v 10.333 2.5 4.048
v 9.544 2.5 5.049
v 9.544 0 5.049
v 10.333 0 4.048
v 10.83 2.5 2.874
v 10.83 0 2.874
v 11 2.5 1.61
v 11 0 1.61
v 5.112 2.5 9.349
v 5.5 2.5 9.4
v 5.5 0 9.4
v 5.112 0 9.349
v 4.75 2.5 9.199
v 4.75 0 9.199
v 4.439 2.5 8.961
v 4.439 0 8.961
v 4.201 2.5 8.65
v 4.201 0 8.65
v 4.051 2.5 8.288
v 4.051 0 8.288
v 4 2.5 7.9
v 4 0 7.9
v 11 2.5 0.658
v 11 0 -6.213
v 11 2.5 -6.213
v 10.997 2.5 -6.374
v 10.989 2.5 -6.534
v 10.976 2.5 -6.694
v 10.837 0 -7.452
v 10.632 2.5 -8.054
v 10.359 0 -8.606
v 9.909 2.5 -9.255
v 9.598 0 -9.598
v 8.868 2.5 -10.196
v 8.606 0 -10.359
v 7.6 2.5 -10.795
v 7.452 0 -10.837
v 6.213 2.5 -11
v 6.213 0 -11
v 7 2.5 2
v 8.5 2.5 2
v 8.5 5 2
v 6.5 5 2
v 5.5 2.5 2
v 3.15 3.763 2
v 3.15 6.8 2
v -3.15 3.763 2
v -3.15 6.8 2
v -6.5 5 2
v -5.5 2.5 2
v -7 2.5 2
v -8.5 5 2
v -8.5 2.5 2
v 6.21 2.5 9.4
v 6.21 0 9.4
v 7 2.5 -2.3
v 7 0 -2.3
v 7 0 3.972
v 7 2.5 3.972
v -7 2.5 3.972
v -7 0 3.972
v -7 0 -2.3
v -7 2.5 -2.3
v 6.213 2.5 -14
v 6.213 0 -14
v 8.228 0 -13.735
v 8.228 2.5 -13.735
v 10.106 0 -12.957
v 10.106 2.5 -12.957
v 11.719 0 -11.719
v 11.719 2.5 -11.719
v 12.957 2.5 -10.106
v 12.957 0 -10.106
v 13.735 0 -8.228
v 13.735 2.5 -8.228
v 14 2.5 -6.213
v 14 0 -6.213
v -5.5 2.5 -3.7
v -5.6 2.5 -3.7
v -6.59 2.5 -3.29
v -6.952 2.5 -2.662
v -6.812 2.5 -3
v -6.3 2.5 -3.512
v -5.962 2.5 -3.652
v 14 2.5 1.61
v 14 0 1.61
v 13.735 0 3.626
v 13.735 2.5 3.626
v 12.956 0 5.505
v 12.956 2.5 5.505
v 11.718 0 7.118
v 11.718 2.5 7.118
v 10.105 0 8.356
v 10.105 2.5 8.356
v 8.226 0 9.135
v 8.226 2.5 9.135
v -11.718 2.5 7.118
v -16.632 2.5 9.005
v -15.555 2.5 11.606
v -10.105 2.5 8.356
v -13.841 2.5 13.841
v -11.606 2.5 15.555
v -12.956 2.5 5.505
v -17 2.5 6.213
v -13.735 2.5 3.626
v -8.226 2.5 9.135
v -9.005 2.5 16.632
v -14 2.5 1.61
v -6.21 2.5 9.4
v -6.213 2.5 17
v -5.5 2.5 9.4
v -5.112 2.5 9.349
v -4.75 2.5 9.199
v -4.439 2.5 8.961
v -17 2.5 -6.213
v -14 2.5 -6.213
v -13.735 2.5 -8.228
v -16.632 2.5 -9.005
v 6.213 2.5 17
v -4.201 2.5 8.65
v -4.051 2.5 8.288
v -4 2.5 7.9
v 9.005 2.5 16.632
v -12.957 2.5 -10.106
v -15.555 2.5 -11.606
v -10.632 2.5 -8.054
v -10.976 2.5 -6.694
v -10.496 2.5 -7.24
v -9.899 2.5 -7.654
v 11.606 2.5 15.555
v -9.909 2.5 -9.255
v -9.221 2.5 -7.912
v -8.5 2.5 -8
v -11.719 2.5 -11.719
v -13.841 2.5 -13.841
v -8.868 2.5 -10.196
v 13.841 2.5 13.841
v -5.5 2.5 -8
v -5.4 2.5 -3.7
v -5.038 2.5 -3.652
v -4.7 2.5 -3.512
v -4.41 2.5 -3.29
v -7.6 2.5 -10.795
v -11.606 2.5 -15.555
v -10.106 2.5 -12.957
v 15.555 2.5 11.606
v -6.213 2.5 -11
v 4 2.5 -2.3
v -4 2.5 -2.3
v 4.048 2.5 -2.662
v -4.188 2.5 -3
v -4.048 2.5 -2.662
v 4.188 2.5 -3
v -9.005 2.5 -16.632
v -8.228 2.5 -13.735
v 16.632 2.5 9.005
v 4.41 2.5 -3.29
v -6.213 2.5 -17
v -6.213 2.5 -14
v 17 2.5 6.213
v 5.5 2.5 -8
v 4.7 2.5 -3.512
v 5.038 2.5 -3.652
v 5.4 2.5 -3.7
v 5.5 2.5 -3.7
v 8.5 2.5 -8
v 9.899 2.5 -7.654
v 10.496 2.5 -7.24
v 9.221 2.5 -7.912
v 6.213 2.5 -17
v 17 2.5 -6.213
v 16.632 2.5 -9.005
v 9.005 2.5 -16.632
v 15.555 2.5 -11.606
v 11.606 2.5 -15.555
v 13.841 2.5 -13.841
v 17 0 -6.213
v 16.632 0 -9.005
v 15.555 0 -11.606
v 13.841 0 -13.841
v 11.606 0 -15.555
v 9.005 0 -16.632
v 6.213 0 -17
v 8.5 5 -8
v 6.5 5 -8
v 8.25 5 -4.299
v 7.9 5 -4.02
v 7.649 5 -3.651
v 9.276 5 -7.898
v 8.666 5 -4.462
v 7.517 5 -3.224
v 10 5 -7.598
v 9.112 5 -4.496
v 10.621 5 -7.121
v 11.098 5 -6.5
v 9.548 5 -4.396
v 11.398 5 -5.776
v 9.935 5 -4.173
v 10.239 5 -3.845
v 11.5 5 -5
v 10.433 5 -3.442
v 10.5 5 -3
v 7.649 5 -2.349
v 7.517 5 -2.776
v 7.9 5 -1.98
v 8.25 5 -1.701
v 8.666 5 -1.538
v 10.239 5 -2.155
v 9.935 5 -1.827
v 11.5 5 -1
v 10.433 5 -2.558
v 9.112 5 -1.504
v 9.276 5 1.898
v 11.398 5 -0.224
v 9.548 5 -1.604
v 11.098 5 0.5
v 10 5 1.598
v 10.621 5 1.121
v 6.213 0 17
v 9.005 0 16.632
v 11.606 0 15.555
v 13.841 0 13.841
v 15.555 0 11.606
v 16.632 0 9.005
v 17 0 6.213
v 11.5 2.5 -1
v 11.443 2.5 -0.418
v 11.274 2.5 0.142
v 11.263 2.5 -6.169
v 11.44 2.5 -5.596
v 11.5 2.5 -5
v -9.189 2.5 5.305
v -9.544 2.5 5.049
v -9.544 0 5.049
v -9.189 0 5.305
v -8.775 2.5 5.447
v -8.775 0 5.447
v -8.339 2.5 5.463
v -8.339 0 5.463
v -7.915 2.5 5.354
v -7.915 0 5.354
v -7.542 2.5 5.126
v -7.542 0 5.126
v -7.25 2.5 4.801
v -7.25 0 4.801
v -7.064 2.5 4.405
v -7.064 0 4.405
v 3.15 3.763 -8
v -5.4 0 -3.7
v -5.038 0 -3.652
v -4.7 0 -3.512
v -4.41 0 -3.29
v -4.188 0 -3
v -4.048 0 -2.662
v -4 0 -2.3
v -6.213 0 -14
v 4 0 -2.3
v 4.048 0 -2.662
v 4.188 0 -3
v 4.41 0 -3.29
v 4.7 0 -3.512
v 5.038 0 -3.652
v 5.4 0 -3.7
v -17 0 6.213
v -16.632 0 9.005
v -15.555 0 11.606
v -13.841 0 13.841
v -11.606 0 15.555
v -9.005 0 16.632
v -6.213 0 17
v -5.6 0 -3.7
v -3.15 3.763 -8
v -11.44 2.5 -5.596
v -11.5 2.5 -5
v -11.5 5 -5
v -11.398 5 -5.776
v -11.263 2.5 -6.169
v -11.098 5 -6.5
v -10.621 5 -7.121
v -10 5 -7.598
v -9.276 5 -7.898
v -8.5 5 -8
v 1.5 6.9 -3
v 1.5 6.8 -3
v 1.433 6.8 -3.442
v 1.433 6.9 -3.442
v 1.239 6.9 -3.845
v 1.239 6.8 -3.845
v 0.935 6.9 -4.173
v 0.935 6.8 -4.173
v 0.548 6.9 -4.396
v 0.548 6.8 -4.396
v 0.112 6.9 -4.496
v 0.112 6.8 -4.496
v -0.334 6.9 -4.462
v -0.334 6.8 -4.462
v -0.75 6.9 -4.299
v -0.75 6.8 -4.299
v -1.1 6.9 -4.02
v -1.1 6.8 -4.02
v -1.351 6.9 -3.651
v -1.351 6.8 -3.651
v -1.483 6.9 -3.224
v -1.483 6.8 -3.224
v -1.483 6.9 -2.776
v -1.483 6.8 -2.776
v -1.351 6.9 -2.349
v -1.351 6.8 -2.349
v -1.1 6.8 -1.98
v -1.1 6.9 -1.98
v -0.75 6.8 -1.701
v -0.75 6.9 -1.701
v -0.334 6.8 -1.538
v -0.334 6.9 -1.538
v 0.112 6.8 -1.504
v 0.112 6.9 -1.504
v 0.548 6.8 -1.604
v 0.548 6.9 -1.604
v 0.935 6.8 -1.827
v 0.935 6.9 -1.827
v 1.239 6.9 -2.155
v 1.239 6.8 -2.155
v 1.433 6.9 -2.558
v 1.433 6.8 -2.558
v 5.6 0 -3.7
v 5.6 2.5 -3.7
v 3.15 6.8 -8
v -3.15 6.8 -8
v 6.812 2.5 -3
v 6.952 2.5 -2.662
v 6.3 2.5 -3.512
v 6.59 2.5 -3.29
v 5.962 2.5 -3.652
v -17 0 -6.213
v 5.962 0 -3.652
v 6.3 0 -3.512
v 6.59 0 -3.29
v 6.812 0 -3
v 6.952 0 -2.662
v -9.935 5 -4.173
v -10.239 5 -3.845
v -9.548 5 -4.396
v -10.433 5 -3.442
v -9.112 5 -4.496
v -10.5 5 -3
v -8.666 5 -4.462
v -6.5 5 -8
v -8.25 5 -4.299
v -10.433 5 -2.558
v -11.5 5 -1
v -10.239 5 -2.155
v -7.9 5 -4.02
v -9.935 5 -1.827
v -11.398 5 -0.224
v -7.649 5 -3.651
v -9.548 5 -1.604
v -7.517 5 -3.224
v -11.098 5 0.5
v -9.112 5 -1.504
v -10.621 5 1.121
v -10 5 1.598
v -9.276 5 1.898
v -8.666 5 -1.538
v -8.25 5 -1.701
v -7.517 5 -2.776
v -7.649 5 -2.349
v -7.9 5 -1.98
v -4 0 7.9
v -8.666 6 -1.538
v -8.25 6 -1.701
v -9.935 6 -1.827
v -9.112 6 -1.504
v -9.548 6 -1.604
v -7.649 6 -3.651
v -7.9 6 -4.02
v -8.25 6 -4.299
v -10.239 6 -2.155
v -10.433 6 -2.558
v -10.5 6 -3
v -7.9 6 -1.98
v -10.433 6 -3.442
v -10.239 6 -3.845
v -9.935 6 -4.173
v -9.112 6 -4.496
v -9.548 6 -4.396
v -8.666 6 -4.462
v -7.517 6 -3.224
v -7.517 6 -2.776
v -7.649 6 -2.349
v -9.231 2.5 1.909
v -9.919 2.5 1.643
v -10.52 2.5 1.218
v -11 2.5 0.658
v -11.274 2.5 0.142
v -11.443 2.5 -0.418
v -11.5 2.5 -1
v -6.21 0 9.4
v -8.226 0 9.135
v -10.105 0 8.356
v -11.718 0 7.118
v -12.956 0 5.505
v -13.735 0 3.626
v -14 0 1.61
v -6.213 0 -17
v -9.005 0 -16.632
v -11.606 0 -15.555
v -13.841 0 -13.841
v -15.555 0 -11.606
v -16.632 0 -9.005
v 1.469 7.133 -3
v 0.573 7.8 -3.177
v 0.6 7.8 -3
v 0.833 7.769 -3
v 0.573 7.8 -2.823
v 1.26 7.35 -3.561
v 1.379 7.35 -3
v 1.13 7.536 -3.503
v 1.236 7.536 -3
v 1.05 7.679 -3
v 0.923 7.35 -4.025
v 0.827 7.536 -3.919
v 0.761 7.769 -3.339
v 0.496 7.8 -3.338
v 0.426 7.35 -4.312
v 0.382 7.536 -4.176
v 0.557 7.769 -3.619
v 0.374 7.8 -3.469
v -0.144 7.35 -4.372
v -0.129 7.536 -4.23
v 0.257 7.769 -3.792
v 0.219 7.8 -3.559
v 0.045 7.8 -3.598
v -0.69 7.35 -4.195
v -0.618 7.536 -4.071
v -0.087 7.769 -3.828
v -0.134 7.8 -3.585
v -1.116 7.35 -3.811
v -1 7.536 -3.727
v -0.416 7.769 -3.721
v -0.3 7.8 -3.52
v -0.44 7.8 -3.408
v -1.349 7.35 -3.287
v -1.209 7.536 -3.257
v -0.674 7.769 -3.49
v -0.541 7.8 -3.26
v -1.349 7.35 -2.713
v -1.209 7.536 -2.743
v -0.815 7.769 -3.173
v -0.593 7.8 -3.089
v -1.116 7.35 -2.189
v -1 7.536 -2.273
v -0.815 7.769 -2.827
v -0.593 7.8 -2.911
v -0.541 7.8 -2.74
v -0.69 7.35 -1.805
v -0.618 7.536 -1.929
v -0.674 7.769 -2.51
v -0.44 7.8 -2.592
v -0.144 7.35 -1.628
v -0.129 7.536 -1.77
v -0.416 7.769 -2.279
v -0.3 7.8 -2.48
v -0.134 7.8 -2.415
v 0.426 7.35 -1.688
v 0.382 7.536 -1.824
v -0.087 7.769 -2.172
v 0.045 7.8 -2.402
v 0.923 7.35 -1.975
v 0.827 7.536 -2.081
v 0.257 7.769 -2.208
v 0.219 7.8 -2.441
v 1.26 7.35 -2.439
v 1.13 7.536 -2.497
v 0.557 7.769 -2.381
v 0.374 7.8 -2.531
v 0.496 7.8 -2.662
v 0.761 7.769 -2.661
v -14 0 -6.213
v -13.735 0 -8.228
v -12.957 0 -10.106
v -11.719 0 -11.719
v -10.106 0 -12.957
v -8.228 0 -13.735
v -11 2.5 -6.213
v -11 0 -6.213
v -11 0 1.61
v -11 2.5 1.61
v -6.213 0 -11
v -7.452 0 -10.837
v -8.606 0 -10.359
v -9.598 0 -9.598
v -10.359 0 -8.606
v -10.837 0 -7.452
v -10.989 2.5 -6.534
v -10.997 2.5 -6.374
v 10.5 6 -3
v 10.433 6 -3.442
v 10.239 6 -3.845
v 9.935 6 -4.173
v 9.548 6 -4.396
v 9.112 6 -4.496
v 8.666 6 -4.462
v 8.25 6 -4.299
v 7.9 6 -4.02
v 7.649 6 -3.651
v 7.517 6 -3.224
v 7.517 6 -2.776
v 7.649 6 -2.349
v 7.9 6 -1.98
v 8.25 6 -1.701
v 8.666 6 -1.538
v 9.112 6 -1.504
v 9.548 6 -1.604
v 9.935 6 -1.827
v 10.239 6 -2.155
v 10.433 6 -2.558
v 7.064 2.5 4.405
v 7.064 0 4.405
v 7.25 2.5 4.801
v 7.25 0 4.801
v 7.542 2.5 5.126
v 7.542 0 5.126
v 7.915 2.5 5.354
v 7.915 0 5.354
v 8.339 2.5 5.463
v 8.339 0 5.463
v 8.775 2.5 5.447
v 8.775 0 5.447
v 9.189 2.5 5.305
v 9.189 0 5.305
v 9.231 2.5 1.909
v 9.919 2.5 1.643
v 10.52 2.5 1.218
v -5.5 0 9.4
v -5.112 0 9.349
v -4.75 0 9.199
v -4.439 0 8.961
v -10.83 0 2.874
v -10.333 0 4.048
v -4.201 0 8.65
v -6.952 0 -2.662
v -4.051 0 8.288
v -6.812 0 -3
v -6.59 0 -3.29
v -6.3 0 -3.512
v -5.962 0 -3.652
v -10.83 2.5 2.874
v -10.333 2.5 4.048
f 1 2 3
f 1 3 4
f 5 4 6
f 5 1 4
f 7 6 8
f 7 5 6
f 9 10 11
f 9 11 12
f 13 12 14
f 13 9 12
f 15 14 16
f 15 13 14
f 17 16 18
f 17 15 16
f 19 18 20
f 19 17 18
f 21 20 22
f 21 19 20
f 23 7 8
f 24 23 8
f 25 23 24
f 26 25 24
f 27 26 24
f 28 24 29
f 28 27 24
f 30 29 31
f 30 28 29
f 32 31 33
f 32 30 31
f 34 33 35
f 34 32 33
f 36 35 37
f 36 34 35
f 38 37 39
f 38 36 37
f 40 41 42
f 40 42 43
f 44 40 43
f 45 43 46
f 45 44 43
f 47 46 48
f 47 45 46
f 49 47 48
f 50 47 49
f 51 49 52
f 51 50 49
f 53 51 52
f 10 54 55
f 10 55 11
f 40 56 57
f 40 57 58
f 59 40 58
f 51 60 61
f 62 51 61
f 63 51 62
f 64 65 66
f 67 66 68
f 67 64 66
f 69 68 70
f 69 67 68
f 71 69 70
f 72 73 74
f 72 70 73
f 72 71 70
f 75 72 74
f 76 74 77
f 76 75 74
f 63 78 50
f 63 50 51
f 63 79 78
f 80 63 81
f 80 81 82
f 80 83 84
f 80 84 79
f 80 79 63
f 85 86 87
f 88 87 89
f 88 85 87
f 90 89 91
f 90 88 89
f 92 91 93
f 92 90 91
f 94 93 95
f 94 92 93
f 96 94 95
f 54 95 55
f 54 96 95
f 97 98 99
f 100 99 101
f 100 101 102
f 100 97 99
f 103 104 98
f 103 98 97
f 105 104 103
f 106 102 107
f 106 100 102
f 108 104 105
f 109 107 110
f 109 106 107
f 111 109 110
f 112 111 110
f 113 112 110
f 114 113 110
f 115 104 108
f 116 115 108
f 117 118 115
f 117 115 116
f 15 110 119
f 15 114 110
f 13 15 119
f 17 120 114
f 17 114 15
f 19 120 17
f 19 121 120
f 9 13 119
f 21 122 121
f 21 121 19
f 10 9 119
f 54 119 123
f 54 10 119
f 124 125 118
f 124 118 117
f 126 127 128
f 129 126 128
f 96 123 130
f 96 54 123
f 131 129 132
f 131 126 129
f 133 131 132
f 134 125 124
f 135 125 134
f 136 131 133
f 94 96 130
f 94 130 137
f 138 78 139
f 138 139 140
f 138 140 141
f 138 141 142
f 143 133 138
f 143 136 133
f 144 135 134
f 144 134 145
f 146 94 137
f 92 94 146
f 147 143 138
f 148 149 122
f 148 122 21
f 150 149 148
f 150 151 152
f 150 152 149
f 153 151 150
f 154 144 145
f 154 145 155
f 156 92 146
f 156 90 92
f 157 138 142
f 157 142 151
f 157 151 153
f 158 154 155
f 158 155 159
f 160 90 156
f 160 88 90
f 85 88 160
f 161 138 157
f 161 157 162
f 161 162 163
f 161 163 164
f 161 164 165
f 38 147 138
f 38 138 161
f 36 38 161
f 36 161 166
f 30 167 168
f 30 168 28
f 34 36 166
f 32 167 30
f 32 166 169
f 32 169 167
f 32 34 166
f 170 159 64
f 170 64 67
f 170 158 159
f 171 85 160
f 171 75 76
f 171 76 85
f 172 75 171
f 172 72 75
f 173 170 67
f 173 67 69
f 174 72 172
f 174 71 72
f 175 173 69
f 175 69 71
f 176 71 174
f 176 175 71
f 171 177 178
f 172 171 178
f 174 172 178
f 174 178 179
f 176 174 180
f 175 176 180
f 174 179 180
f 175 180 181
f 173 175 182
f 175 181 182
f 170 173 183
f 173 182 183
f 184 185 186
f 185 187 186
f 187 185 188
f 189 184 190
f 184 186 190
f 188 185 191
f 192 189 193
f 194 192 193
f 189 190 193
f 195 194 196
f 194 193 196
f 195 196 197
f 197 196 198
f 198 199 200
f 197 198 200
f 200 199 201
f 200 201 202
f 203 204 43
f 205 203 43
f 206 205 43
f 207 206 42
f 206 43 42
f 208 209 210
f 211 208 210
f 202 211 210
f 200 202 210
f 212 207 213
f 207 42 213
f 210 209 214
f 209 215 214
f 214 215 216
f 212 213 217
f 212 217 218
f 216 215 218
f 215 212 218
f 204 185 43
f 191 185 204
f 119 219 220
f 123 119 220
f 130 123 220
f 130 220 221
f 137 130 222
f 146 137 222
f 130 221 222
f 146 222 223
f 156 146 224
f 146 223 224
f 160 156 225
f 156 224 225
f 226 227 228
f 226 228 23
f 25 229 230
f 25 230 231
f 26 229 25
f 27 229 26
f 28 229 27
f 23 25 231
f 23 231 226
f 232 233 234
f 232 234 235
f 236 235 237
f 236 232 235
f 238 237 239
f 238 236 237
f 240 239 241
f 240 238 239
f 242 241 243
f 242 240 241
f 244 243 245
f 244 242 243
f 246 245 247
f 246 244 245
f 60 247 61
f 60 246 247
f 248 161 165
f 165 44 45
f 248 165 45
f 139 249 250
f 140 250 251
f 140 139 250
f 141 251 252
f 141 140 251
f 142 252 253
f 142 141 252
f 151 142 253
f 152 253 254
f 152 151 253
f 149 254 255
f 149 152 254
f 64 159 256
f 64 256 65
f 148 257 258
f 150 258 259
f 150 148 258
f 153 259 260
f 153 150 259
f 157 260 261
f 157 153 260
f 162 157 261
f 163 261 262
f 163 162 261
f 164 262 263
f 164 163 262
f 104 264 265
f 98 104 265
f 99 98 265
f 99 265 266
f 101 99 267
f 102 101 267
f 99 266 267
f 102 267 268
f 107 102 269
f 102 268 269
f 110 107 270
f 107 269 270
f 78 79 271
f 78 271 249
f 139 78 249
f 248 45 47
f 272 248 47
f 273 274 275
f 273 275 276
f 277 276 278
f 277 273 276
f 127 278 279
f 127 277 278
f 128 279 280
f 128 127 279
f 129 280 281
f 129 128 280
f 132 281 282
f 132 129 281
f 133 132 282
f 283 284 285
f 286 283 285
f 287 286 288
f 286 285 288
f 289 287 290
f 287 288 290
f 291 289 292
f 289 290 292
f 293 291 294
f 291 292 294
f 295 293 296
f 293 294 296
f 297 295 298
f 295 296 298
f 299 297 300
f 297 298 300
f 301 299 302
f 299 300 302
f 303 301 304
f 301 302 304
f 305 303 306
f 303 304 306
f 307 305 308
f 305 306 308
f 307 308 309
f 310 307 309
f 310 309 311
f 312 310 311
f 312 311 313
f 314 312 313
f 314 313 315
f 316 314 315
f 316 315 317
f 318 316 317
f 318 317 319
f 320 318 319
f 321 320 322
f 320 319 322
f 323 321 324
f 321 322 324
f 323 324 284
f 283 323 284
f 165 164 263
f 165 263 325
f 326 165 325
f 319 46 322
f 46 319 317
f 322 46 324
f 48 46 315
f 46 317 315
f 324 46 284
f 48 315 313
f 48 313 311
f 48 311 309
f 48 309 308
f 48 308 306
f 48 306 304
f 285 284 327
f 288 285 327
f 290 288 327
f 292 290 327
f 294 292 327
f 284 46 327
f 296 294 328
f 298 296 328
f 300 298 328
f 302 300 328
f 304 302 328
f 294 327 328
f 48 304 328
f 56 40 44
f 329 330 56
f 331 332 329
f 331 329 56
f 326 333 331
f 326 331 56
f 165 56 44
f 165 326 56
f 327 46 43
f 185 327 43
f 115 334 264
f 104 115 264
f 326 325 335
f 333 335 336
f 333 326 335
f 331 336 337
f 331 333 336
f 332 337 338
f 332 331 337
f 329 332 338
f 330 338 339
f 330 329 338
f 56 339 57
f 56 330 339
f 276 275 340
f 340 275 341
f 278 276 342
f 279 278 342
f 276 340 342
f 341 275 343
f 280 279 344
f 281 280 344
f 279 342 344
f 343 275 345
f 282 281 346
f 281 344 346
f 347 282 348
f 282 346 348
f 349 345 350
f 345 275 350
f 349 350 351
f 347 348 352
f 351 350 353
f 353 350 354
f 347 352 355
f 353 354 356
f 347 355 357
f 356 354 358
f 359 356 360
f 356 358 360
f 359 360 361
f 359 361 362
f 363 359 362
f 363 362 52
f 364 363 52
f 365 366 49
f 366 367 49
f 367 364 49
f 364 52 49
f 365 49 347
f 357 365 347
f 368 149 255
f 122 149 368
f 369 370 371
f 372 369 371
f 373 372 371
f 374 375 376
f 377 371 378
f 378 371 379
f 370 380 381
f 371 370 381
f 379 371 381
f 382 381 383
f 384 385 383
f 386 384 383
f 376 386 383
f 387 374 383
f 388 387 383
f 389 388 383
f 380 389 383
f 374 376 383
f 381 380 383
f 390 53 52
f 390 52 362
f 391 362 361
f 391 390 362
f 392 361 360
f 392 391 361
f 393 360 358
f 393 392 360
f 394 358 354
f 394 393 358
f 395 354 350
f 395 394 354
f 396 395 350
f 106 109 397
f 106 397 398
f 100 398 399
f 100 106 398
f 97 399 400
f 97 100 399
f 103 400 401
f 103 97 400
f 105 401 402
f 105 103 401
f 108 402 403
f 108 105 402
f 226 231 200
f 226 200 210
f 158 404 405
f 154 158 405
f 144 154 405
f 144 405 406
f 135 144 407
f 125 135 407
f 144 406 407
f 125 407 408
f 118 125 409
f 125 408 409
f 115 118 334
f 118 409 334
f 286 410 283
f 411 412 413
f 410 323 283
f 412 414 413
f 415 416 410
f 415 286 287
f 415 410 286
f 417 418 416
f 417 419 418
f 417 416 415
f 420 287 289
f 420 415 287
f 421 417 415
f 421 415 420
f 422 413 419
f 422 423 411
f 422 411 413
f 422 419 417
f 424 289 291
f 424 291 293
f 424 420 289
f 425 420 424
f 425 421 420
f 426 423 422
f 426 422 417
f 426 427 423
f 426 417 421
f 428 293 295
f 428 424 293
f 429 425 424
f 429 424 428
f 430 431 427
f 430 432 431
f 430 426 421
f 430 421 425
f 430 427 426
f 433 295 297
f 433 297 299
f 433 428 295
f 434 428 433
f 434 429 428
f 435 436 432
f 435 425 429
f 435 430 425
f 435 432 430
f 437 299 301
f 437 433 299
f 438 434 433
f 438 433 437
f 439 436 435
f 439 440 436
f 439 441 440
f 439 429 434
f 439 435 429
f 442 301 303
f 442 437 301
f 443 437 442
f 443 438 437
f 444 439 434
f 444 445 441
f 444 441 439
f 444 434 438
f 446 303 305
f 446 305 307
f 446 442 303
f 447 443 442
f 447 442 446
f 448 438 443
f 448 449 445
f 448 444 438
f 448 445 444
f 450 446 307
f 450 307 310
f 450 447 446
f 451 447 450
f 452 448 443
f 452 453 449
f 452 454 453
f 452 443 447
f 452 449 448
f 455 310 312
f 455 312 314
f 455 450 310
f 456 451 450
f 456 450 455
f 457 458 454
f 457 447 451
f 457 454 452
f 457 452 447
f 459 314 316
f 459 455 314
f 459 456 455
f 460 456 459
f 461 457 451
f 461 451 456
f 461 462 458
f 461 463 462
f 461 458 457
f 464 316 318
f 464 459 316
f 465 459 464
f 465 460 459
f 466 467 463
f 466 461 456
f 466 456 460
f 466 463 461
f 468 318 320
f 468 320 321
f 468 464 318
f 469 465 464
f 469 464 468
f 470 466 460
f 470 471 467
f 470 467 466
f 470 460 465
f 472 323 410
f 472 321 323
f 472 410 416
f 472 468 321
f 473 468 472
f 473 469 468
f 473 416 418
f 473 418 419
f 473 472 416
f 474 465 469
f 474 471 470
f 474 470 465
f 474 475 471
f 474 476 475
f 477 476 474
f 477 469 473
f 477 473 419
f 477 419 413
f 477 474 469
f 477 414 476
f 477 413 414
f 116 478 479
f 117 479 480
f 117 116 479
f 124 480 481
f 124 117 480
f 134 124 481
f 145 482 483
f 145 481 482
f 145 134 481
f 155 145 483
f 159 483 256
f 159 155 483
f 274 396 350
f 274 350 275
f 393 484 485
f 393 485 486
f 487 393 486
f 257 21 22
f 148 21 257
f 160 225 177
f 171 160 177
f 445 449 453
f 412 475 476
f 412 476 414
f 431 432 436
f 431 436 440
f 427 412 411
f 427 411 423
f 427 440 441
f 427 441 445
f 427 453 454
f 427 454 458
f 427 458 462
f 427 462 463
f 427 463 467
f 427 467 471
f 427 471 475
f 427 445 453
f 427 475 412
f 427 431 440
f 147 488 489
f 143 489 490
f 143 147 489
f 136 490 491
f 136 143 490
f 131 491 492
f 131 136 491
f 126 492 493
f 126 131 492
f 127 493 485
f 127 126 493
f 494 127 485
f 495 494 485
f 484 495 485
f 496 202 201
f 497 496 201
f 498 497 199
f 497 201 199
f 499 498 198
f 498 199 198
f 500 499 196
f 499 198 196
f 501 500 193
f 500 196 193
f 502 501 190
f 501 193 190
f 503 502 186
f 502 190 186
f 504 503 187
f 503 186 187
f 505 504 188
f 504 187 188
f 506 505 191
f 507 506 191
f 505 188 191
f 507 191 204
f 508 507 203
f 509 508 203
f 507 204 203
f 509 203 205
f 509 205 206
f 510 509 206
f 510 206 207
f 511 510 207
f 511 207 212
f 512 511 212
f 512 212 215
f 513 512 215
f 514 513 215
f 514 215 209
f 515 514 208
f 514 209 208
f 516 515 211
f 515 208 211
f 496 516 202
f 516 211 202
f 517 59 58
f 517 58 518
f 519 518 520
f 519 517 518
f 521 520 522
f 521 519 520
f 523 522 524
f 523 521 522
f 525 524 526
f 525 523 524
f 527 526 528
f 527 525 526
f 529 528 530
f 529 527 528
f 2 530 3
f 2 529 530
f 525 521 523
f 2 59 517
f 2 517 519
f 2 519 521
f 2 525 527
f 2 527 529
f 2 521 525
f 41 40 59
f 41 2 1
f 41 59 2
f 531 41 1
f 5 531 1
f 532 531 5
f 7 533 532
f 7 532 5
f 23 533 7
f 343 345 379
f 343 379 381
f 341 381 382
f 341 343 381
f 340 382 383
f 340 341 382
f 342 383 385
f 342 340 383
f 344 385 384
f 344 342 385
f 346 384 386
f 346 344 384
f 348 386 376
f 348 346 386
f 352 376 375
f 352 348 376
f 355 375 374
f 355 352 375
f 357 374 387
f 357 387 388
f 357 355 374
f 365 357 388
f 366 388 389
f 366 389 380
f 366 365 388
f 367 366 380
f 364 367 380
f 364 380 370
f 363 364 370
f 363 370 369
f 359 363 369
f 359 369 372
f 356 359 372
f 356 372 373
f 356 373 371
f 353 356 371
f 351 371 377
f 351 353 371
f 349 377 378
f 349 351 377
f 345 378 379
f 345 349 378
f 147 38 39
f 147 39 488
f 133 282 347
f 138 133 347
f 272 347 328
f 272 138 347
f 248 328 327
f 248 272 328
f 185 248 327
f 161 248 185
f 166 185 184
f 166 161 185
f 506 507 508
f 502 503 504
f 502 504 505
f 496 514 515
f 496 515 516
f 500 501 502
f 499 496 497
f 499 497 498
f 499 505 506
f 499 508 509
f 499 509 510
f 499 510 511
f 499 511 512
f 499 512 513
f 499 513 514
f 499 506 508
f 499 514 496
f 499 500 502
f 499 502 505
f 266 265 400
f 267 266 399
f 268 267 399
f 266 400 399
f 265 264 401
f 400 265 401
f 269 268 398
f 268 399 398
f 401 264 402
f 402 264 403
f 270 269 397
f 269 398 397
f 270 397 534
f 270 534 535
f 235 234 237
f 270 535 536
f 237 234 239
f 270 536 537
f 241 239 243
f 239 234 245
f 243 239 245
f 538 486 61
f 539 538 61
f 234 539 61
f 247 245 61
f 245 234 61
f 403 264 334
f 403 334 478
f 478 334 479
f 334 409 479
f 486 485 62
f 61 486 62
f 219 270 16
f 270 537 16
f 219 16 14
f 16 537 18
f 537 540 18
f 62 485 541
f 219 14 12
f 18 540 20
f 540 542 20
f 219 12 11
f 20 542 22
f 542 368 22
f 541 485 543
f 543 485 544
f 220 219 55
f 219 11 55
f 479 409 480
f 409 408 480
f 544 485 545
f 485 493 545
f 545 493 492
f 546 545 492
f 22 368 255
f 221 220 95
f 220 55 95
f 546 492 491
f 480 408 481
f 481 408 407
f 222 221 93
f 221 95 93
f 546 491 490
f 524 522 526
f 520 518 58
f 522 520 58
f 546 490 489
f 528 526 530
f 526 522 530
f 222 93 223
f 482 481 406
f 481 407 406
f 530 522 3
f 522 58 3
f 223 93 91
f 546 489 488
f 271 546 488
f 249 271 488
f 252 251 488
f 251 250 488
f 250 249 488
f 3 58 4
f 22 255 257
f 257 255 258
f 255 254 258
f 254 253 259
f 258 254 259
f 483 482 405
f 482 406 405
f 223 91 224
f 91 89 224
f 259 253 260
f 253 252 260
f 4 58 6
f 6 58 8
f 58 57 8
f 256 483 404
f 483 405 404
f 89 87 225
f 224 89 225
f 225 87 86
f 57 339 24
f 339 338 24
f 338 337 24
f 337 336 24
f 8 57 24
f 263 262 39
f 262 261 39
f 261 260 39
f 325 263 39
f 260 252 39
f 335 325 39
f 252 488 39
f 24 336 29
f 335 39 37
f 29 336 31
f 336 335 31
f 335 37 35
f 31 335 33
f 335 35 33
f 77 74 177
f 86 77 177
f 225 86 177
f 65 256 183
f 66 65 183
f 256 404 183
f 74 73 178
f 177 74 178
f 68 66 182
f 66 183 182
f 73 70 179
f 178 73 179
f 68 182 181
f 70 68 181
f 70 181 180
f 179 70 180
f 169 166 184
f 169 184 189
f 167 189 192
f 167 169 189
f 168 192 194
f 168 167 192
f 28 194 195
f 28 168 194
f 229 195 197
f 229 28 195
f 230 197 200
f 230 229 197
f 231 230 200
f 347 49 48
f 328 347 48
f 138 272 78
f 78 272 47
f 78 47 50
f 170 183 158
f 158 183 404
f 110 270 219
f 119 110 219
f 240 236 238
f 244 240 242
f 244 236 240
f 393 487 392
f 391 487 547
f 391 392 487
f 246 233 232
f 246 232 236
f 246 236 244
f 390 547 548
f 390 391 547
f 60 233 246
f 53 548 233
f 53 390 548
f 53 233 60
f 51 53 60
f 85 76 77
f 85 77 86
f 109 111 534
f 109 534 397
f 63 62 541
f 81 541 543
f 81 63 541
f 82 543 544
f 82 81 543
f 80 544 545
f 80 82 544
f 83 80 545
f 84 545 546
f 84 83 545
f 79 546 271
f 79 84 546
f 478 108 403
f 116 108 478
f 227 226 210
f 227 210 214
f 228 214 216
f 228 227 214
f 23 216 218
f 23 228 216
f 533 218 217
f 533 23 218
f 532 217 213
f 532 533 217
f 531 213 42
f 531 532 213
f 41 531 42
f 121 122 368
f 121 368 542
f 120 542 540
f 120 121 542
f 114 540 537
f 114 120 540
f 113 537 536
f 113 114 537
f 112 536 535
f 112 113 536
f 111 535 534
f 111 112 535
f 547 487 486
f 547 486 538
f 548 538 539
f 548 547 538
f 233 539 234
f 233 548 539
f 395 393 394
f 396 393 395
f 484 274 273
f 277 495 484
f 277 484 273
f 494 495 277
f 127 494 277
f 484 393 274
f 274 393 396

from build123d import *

# Parameters (mm, degrees)
BOSS_EXTRUDE1_DEPTH = 2.5
CUT_EXTRUDE1_DEPTH  = 3.5
BOSS_EXTRUDE2_DEPTH = 4.3
CUT_EXTRUDE2_DEPTH  = 20
SKETCH5_R           = 1.5
BOSS_EXTRUDE3_DEPTH = 1
SKETCH6_R           = 1.5
BOSS_EXTRUDE4_DEPTH = 1
FILLET1_R           = 0.9


with BuildPart() as part:
    # Sketch1 → Boss-Extrude1 (new body)
    with BuildSketch(Plane(origin=(0, 0, 0), x_dir=(1, 0, 0), z_dir=(0, 1, 0))):
        with BuildLine():
            Line((-6.212908396, -17), (6.212908396, -17))
            ThreePointArc((6.212908396, -17), (13.840534019, -13.840534019), (17, -6.212908396))
            Line((17, -6.212908396), (17, 6.212908396))
            ThreePointArc((17, 6.212908396), (13.840534019, 13.840534019), (6.212908396, 17))
            Line((6.212908396, 17), (-6.212908396, 17))
            ThreePointArc((-6.212908396, 17), (-13.840534019, 13.840534019), (-17, 6.212908396))
            Line((-17, 6.212908396), (-17, -6.212908396))
            ThreePointArc((-17, -6.212908396), (-13.840534019, -13.840534019), (-6.212908396, -17))
        make_face()
    extrude(amount=BOSS_EXTRUDE1_DEPTH)

    # Sketch2 → Cut-Extrude1 (cut, through all)
    with BuildSketch(Plane(origin=(0, 2.5, 0), x_dir=(1, 0, 0), z_dir=(0, 1, 0))):
        with BuildLine():
            Line((5.4, 3.7), (5.6, 3.7))
            ThreePointArc((5.6, 3.7), (6.589949494, 3.289949494), (7, 2.3))
            Line((7, 2.3), (7, -3.972202362))
            ThreePointArc((7, -3.972202362), (7.915239118, -5.353525898), (9.544072948, -5.049194321))
            ThreePointArc((9.544072948, -5.049194321), (10.621026492, -3.477336416), (11, -1.61))
            Line((11, -1.61), (11, 6.212908396))
            ThreePointArc((11, 6.212908396), (9.597893331, 9.597893331), (6.212908396, 11))
            Line((6.212908396, 11), (-6.212908396, 11))
            ThreePointArc((-6.212908396, 11), (-9.597893331, 9.597893331), (-11, 6.212908396))
            Line((-11, 6.212908396), (-11, -1.61))
            ThreePointArc((-11, -1.61), (-10.621026492, -3.477336416), (-9.544072948, -5.049194321))
            ThreePointArc((-9.544072948, -5.049194321), (-7.915239118, -5.353525898), (-7, -3.972202362))
            Line((-7, -3.972202362), (-7, 2.3))
            ThreePointArc((-7, 2.3), (-6.589949494, 3.289949494), (-5.6, 3.7))
            Line((-5.6, 3.7), (-5.4, 3.7))
            ThreePointArc((-5.4, 3.7), (-4.410050506, 3.289949494), (-4, 2.3))
            Line((-4, 2.3), (-4, -7.9))
            ThreePointArc((-4, -7.9), (-4.439339828, -8.960660172), (-5.5, -9.4))
            Line((-5.5, -9.4), (-6.21, -9.4))
            ThreePointArc((-6.21, -9.4), (-11.718361825, -7.118361825), (-14, -1.61))
            Line((-14, -1.61), (-14, 6.212908396))
            ThreePointArc((-14, 6.212908396), (-11.719213675, 11.719213675), (-6.212908396, 14))
            Line((-6.212908396, 14), (6.212908396, 14))
            ThreePointArc((6.212908396, 14), (11.719213675, 11.719213675), (14, 6.212908396))
            Line((14, 6.212908396), (14, -1.61))
            ThreePointArc((14, -1.61), (11.718361825, -7.118361825), (6.21, -9.4))
            Line((6.21, -9.4), (5.5, -9.4))
            ThreePointArc((5.5, -9.4), (4.439339828, -8.960660172), (4, -7.9))
            Line((4, -7.9), (4, 2.3))
            ThreePointArc((4, 2.3), (4.410050506, 3.289949494), (5.4, 3.7))
        make_face()
    extrude(amount=-CUT_EXTRUDE1_DEPTH, mode=Mode.SUBTRACT)

    # Sketch3 → Boss-Extrude2 (add)
    with BuildSketch(Plane(origin=(0, 2.5, 0), x_dir=(1, 0, 0), z_dir=(0, 1, 0))):
        with BuildLine():
            Line((-8.5, 8), (8.5, 8))
            ThreePointArc((8.5, 8), (10.621320344, 7.121320344), (11.5, 5))
            Line((11.5, 5), (11.5, 1))
            ThreePointArc((11.5, 1), (10.621320344, -1.121320344), (8.5, -2))
            Line((8.5, -2), (-8.5, -2))
            ThreePointArc((-8.5, -2), (-10.621320344, -1.121320344), (-11.5, 1))
            Line((-11.5, 1), (-11.5, 5))
            ThreePointArc((-11.5, 5), (-10.621320344, 7.121320344), (-8.5, 8))
        make_face()
    extrude(amount=BOSS_EXTRUDE2_DEPTH)

    # Sketch4 → Cut-Extrude2 (cut, through all)
    with BuildSketch(Plane.XY.offset(2)):
        Polygon((-11.5, 5), (-6.5, 5), (-3.15, 6.8), (3.15, 6.8), (6.5, 5), (11.5, 5), (14.66460311, 7.657087543), (13.998030241, 12.878575014), (-15.83110563, 15.267127793), (-17.386442324, 7.657087543), align=None)
        Polygon((3.15, 3.762686567), (-3.15, 3.762686567), (-5.5, 2.5), (5.5, 2.5), align=None)
    extrude(amount=-CUT_EXTRUDE2_DEPTH, mode=Mode.SUBTRACT)

    # Sketch5 → Boss-Extrude3 (add)
    with BuildSketch(Plane(origin=(0, 5, 0), x_dir=(1, 0, 0), z_dir=(0, 1, 0))):
        with Locations((9, 3)):
            Circle(SKETCH5_R)
    boss_extrude3 = extrude(amount=BOSS_EXTRUDE3_DEPTH)

    # Mirror1: Boss-Extrude3 across plane
    add(boss_extrude3.mirror(Plane(origin=(0, 0, 0), x_dir=(0, 0, 1), z_dir=(1, 0, 0))))

    # Sketch6 → Boss-Extrude4 (add)
    with BuildSketch(Plane(origin=(0, 6.8, 0), x_dir=(1, 0, 0), z_dir=(0, 1, 0))):
        with Locations((0, 3)):
            Circle(SKETCH6_R)
    extrude(amount=BOSS_EXTRUDE4_DEPTH)

    # Fillet1
    fillet1_edges = [part.edges().sort_by_distance(p)[0] for p in [
        (-1.5, 7.8, -3),
    ]]
    fillet(fillet1_edges, radius=FILLET1_R)


solid = part.part
